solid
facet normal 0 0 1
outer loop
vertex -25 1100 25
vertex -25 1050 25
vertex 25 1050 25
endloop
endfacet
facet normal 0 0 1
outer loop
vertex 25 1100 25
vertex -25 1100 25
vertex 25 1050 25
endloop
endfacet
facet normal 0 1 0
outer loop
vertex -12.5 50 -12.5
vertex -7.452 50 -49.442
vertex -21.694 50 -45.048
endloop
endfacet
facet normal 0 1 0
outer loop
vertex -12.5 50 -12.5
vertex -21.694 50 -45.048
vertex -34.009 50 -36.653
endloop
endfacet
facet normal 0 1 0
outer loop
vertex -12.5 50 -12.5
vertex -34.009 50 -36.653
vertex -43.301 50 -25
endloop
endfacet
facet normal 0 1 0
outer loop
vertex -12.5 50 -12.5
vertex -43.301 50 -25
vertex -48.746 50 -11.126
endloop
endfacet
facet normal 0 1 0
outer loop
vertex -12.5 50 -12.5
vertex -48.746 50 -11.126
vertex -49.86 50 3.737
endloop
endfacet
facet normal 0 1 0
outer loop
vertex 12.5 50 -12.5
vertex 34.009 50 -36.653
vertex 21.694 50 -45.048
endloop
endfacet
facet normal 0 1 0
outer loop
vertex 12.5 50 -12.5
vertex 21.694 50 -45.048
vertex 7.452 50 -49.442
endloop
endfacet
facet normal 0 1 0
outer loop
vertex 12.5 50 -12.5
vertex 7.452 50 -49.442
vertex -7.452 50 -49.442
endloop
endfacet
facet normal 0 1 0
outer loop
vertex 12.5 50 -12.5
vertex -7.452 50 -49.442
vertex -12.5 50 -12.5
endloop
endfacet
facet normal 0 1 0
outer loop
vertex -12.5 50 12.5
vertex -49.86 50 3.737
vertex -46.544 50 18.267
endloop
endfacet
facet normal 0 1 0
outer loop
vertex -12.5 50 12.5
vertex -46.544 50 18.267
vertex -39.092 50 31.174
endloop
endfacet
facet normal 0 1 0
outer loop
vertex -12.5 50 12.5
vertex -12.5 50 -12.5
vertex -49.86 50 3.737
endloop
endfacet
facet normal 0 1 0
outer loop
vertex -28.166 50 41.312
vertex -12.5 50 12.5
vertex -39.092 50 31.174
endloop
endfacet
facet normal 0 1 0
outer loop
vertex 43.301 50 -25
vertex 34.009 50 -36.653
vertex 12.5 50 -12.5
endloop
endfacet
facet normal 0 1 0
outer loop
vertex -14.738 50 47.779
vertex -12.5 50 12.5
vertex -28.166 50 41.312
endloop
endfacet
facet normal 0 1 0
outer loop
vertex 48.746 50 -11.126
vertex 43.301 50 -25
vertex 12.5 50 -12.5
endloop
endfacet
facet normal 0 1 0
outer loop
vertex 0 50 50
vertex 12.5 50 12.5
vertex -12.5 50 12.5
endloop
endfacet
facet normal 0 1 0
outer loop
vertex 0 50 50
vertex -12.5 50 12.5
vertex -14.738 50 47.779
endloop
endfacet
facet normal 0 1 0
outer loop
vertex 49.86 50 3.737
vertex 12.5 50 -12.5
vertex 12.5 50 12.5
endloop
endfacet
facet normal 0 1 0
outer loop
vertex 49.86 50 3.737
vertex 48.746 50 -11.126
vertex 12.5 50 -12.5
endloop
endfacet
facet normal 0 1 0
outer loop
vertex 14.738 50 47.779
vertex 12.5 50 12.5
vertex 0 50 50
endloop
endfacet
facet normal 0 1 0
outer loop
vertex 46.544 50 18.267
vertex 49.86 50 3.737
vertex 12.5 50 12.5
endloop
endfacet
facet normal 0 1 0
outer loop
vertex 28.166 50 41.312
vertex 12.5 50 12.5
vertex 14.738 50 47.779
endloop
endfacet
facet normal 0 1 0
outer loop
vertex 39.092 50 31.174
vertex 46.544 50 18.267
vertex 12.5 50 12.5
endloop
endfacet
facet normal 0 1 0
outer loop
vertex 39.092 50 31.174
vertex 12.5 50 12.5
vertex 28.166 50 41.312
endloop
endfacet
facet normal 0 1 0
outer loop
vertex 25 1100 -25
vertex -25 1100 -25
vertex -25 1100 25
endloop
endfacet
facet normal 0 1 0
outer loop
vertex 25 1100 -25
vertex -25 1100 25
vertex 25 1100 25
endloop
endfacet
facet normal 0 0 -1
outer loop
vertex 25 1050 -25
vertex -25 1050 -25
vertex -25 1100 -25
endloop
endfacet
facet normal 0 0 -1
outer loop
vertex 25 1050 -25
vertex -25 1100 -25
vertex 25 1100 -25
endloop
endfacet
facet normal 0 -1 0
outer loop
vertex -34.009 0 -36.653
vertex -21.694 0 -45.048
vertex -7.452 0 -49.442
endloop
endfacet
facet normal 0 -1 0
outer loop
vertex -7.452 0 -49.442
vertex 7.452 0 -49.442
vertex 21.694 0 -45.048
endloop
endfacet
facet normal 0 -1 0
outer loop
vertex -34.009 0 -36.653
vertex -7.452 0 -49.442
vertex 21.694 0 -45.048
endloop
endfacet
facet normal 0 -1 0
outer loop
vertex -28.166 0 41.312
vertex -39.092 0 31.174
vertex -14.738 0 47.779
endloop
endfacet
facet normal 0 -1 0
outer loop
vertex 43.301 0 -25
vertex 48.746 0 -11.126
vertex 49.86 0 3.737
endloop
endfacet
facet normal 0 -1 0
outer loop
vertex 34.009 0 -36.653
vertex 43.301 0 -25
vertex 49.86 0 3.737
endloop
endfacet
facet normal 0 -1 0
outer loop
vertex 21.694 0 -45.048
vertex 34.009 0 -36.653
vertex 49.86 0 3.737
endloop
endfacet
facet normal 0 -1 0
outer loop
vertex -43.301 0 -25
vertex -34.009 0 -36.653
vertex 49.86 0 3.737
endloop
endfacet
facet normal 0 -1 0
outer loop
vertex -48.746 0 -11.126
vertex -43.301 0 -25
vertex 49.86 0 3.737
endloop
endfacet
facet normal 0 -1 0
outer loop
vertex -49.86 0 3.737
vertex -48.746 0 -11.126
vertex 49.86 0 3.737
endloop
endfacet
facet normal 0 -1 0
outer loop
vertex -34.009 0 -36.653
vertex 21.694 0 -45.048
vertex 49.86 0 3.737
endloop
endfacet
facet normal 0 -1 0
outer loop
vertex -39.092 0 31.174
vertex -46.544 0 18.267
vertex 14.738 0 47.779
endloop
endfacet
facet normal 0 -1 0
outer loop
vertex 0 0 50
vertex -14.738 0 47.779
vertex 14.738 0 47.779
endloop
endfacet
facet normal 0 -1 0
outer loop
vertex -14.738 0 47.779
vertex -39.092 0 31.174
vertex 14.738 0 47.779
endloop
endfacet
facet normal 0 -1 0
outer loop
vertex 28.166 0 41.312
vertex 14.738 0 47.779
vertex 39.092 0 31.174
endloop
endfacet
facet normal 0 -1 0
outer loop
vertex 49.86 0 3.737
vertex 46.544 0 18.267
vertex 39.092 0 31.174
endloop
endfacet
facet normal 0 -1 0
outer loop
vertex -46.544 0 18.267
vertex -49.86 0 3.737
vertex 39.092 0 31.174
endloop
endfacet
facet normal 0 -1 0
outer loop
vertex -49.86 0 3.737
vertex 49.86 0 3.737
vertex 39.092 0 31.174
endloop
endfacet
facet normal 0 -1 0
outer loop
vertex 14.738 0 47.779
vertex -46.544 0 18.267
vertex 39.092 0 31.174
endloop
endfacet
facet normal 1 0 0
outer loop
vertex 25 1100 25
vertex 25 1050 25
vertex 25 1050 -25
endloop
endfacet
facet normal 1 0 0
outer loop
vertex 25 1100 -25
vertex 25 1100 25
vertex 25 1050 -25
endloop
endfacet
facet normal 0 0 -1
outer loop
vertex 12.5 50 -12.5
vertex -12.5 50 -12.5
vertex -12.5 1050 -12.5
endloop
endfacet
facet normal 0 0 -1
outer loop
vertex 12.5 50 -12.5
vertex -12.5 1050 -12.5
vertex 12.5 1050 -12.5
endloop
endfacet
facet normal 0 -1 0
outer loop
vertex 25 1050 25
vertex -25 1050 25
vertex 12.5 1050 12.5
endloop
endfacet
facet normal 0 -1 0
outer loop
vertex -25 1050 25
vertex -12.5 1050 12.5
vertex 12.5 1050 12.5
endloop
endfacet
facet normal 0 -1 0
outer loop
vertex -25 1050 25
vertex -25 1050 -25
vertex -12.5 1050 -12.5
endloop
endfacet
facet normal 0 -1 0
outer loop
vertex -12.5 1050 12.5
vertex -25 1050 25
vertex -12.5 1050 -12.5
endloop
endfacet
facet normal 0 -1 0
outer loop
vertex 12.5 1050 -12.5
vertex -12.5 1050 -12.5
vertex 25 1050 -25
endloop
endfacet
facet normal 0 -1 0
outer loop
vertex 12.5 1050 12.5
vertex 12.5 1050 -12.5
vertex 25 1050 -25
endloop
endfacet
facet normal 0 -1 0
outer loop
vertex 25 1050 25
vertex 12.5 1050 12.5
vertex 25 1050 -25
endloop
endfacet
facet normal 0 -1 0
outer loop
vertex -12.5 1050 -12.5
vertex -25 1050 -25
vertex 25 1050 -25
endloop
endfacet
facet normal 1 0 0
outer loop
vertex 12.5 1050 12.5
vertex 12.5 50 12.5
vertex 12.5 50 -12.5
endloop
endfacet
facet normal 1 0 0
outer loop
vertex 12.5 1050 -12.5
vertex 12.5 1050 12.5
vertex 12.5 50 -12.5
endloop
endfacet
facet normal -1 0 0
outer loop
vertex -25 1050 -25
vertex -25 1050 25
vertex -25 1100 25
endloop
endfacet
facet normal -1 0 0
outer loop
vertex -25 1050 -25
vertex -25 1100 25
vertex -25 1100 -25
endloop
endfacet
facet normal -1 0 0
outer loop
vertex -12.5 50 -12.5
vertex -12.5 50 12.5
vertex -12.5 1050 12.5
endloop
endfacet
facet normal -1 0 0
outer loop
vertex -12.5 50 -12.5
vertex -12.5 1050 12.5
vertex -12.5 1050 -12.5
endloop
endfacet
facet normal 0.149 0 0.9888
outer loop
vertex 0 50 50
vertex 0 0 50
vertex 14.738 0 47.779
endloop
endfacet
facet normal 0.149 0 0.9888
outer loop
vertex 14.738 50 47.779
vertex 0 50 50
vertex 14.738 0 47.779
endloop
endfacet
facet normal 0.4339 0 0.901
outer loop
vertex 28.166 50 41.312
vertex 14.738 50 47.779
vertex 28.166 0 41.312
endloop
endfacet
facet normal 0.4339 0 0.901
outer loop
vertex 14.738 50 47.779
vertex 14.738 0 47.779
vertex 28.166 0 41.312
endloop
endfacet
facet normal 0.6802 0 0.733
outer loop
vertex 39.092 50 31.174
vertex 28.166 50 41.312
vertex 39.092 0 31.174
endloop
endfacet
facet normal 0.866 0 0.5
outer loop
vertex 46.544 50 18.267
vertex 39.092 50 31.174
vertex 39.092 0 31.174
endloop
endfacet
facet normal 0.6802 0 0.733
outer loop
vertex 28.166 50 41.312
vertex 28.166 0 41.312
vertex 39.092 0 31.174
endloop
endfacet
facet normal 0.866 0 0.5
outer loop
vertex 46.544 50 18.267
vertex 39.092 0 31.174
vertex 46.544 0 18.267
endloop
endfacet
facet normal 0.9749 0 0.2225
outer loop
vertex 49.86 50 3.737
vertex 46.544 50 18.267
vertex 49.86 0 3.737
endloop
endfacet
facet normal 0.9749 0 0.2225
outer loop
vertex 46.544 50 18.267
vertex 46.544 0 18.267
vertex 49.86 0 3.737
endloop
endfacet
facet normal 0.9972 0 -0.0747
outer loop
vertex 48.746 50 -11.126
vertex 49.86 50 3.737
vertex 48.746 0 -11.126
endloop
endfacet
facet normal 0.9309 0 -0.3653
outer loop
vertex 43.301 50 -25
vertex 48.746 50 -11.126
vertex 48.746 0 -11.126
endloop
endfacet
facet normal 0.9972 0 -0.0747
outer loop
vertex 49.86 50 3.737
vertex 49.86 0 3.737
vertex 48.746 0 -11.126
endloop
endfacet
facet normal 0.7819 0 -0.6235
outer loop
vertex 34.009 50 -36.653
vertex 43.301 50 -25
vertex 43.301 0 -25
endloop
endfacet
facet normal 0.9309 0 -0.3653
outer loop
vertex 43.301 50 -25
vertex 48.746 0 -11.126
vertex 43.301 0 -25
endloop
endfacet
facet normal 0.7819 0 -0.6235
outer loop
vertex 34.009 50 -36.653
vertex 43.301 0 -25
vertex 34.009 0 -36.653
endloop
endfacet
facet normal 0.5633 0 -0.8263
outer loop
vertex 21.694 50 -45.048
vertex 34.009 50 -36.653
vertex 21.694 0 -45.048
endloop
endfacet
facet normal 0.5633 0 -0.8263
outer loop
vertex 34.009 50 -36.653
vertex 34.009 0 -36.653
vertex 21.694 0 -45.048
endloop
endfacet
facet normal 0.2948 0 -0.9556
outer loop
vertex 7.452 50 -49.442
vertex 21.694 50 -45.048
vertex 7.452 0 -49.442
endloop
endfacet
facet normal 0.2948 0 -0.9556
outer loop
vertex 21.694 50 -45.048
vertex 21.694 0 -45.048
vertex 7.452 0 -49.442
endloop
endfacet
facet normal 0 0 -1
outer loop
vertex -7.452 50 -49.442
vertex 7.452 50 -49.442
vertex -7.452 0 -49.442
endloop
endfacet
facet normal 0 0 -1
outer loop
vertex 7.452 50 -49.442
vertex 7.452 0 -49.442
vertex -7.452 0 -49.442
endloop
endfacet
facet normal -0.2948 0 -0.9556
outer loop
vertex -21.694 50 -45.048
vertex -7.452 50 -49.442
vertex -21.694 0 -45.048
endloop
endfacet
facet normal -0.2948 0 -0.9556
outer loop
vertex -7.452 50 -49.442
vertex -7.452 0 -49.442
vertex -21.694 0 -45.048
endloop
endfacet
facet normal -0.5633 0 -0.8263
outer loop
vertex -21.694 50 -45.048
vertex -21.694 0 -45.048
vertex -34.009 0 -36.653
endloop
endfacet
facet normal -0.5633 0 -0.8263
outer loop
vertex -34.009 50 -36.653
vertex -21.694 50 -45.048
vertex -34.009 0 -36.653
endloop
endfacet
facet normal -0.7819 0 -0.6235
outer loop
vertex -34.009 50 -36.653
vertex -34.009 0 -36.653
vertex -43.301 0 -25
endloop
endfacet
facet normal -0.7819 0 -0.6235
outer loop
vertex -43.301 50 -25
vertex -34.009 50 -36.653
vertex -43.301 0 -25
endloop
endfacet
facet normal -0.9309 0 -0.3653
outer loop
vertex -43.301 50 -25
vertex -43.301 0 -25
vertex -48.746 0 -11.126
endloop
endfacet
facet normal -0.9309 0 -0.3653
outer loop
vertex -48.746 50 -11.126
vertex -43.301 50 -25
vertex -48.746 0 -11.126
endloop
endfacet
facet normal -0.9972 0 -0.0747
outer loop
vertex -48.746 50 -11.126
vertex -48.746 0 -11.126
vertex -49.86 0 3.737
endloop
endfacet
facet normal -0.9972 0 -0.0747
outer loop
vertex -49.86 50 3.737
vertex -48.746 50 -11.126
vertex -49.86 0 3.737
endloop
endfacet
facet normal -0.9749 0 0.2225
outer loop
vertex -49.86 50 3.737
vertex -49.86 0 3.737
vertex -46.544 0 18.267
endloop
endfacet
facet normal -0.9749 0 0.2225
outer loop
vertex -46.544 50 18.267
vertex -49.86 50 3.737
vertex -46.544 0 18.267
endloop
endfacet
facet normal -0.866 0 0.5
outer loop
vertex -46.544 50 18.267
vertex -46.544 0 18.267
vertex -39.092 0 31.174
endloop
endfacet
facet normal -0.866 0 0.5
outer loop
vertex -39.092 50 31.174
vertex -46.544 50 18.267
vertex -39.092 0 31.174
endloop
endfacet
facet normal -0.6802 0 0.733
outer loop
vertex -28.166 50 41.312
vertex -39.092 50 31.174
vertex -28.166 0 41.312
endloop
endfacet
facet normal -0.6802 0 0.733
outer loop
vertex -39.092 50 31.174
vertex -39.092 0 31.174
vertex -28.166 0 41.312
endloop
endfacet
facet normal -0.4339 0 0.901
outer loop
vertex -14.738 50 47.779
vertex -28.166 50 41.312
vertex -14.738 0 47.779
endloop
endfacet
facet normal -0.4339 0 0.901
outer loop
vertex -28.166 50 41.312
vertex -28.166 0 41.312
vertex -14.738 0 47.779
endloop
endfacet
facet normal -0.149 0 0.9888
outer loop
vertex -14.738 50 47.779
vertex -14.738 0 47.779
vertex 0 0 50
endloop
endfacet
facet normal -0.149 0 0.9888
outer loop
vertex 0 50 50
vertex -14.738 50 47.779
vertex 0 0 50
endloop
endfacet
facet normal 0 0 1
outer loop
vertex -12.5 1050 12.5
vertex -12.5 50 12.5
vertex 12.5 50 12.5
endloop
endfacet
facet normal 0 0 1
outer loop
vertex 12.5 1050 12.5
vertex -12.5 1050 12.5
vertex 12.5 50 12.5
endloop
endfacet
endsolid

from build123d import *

# Parameters (mm, degrees)
SKETCH1_R           = 50
BOSS_EXTRUDE1_DEPTH = 50
SKETCH2_W           = 25
SKETCH2_H           = 25
BOSS_EXTRUDE2_DEPTH = 1000
SKETCH3_W           = 50
SKETCH3_H           = 50
BOSS_EXTRUDE3_DEPTH = 50


with BuildPart() as part:
    # Sketch1 → Boss-Extrude1 (new body)
    with BuildSketch(Plane(origin=(0, 0, 0), x_dir=(1, 0, 0), z_dir=(0, 1, 0))):
        with Locations(Location((0, 0, 0), (0, 0, 270))):
            Circle(SKETCH1_R)
    extrude(amount=BOSS_EXTRUDE1_DEPTH)

    # Sketch2 → Boss-Extrude2 (add)
    with BuildSketch(Plane(origin=(0, 50, 0), x_dir=(1, 0, 0), z_dir=(0, 1, 0))):
        Rectangle(SKETCH2_W, SKETCH2_H)
    extrude(amount=BOSS_EXTRUDE2_DEPTH)

    # Sketch3 → Boss-Extrude3 (add)
    with BuildSketch(Plane(origin=(0, 1050, 0), x_dir=(1, 0, 0), z_dir=(0, 1, 0))):
        Rectangle(SKETCH3_W, SKETCH3_H)
    extrude(amount=BOSS_EXTRUDE3_DEPTH)


solid = part.part
